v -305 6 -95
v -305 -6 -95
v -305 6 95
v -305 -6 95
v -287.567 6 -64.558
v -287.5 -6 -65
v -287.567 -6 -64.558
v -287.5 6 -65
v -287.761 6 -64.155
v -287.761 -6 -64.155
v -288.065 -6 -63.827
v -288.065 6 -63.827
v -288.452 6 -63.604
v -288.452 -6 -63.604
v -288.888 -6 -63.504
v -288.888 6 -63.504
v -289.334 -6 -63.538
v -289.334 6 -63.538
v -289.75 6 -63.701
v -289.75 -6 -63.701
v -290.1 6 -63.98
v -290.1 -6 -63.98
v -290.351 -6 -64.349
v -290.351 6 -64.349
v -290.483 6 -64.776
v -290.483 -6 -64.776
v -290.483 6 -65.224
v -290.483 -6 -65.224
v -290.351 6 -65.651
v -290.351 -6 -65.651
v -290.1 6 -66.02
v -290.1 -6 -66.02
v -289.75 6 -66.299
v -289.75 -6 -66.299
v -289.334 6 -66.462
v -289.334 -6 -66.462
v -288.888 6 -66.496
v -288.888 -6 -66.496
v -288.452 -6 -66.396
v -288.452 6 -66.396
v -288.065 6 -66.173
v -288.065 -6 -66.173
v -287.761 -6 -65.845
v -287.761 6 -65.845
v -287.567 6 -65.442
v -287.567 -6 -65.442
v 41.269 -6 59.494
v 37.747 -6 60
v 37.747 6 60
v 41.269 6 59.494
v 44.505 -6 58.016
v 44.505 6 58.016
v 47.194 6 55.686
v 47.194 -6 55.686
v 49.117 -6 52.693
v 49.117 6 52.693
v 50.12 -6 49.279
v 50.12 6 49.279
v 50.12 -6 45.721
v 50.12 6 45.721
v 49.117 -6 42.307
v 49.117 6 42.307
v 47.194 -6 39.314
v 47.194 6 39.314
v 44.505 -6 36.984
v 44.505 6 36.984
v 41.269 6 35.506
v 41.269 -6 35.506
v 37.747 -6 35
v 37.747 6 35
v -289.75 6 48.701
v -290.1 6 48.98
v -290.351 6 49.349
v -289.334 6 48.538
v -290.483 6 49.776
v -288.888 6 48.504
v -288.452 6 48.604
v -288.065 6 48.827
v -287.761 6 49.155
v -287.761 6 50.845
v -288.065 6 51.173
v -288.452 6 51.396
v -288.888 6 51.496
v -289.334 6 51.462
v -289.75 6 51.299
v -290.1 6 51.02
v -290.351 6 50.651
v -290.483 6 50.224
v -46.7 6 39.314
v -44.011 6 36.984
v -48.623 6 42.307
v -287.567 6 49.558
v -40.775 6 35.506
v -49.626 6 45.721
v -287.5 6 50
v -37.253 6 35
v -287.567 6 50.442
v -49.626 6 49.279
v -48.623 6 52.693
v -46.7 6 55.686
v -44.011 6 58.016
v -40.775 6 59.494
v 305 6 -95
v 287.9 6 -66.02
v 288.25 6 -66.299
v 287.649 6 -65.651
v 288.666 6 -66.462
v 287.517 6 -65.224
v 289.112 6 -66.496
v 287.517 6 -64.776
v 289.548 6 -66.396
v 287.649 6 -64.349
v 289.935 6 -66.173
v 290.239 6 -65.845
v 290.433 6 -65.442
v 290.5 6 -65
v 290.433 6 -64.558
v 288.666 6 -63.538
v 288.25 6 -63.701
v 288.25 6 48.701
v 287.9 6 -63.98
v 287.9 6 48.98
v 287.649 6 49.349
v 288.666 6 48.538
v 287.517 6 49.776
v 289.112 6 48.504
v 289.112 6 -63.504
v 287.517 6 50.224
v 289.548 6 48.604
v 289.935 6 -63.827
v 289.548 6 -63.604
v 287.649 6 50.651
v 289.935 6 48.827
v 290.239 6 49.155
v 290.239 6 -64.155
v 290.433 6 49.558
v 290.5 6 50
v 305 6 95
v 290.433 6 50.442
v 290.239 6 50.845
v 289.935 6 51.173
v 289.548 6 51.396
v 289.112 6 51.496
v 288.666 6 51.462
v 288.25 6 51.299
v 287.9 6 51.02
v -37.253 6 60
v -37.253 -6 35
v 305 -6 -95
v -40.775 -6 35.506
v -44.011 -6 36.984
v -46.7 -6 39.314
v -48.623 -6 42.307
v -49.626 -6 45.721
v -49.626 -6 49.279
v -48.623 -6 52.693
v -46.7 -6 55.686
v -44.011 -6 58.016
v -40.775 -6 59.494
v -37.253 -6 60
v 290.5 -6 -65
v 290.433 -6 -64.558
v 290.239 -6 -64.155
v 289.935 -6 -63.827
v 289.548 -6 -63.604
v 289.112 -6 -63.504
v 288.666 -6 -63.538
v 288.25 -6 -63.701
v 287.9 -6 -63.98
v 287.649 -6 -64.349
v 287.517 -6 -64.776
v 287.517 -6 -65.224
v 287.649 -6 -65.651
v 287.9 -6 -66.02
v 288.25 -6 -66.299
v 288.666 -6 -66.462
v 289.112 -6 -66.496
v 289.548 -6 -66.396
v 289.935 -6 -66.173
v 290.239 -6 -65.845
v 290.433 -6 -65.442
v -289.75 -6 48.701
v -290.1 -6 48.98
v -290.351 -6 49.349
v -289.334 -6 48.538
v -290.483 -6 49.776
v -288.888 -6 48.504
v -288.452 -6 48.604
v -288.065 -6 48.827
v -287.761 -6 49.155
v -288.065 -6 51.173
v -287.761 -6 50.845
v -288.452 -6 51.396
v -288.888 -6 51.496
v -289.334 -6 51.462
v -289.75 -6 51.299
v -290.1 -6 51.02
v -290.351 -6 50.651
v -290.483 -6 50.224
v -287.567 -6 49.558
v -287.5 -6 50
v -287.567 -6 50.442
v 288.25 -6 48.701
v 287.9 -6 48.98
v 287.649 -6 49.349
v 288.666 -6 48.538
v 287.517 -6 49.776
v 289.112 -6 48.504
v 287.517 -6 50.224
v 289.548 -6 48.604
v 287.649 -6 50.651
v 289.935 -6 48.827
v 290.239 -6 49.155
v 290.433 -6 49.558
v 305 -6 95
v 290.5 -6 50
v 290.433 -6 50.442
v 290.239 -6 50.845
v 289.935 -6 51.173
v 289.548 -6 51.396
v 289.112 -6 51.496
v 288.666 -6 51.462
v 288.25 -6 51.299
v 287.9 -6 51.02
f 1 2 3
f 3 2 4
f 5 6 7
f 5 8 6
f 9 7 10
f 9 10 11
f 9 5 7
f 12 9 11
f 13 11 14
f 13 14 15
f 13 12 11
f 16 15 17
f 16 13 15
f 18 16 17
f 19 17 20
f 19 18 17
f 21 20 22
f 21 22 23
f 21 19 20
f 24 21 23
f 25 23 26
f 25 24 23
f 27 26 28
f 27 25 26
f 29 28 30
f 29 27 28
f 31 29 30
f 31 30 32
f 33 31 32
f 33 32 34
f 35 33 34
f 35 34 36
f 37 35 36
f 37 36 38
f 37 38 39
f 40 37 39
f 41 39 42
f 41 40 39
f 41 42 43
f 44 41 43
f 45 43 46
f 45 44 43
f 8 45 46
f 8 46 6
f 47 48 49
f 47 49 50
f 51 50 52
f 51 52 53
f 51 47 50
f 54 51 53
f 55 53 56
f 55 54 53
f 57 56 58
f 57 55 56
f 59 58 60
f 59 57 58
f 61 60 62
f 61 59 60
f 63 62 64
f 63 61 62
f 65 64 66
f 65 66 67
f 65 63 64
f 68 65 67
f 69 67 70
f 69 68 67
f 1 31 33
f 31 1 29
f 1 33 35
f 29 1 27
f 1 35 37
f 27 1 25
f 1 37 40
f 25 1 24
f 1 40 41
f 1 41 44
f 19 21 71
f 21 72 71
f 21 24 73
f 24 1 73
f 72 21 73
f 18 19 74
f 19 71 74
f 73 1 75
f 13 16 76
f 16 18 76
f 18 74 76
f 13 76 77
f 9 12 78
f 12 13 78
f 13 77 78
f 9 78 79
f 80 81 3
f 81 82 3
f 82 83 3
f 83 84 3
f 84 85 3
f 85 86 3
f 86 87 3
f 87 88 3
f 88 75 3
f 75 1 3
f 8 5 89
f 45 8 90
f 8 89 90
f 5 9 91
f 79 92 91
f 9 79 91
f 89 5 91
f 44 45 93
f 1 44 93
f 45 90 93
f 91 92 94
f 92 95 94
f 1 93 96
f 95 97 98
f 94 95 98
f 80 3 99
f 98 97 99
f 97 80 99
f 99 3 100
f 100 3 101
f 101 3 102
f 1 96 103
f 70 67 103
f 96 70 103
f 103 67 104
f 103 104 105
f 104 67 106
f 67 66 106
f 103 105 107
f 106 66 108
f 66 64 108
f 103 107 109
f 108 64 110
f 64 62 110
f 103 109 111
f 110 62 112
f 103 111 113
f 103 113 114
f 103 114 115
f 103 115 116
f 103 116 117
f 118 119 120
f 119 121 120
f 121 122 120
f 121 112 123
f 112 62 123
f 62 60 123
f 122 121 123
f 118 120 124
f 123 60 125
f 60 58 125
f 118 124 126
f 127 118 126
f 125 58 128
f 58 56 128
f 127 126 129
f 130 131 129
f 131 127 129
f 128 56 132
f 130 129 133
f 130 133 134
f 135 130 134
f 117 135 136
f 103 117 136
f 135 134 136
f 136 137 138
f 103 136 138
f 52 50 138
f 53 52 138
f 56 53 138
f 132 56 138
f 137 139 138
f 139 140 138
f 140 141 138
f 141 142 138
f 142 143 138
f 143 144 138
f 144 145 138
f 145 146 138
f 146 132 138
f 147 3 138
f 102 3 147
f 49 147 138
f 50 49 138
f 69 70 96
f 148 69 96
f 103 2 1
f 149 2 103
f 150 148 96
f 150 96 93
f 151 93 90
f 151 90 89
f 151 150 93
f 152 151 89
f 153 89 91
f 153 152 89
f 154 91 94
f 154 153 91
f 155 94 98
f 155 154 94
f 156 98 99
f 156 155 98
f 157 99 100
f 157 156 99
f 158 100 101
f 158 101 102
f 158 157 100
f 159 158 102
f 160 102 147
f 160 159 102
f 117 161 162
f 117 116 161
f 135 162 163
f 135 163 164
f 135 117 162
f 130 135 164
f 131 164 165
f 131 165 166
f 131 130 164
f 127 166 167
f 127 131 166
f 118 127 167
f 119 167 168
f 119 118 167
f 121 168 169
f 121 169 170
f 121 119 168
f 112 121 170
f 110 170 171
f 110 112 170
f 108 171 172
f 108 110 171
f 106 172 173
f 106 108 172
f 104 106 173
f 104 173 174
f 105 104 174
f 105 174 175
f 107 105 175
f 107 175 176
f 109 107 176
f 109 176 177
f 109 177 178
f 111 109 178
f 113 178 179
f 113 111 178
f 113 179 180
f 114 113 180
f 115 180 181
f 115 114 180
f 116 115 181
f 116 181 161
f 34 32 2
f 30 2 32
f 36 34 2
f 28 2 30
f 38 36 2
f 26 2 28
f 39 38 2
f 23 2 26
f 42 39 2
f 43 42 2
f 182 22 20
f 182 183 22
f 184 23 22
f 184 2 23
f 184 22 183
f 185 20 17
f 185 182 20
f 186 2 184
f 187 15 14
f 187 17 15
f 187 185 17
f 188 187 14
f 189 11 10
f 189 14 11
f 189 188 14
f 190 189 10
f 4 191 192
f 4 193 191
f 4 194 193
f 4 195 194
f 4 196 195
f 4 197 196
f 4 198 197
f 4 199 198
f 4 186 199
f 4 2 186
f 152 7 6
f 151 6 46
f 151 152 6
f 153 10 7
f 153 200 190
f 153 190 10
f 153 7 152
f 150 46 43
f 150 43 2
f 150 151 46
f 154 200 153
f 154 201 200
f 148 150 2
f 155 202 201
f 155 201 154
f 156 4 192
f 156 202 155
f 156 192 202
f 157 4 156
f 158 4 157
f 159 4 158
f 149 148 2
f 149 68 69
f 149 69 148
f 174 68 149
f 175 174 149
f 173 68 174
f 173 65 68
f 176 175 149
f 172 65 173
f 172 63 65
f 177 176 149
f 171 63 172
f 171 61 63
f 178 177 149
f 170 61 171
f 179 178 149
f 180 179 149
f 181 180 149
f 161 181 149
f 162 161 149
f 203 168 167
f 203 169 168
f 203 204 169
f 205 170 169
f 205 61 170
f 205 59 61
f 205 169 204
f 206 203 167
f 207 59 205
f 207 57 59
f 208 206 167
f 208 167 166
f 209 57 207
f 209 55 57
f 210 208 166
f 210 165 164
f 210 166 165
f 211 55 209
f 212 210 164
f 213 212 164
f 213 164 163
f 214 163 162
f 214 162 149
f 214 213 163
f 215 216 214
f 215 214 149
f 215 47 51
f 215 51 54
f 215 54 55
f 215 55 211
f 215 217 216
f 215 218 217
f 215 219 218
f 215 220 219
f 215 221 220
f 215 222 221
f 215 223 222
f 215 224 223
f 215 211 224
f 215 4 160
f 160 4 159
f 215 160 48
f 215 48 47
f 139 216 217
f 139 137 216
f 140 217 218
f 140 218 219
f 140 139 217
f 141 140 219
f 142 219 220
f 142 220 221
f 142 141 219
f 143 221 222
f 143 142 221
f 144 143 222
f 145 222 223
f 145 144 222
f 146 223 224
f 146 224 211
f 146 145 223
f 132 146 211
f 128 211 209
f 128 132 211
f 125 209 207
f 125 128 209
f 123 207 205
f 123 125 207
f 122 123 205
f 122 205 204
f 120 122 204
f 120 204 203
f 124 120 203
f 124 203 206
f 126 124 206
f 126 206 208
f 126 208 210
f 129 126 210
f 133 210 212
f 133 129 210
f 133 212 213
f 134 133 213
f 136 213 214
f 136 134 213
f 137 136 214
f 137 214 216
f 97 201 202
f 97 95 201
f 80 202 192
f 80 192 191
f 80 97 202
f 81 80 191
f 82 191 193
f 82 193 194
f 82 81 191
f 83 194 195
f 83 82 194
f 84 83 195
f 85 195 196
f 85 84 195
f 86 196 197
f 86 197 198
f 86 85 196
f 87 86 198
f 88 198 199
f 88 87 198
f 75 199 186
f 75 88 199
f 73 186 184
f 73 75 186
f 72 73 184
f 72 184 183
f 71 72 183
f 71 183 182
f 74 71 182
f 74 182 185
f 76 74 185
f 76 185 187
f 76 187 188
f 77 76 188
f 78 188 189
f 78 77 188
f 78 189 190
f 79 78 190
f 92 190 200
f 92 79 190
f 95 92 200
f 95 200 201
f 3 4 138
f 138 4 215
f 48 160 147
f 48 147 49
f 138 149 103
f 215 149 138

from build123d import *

# Parameters (mm, degrees)
F0_W     = 610
F0_H     = 190
F0_R     = 1.5
F1_DEPTH = 6


with BuildPart() as f1:
    # F0 (on Front) → F1 (new body, symmetric)
    with BuildSketch(Plane.XZ):
        Rectangle(F0_W, F0_H)
        with Locations((-289, -65)):
            Circle(F0_R, mode=Mode.SUBTRACT)
        with Locations((289, -65)):
            Circle(F0_R, mode=Mode.SUBTRACT)
        with Locations((-289, 50)):
            Circle(F0_R, mode=Mode.SUBTRACT)
        with BuildLine():
            ThreePointArc((37.7469517291, 60), (50.2469517291, 47.5), (37.7469517291, 35))
            Line((37.7469517291, 35), (-37.2530482709, 35))
            ThreePointArc((-37.2530482709, 35), (-49.7530482709, 47.5), (-37.2530482709, 60))
            Line((-37.2530482709, 60), (37.7469517291, 60))
        make_face(mode=Mode.SUBTRACT)
        with Locations((289, 50)):
            Circle(F0_R, mode=Mode.SUBTRACT)
    extrude(amount=F1_DEPTH, both=True)


solid = f1.part
